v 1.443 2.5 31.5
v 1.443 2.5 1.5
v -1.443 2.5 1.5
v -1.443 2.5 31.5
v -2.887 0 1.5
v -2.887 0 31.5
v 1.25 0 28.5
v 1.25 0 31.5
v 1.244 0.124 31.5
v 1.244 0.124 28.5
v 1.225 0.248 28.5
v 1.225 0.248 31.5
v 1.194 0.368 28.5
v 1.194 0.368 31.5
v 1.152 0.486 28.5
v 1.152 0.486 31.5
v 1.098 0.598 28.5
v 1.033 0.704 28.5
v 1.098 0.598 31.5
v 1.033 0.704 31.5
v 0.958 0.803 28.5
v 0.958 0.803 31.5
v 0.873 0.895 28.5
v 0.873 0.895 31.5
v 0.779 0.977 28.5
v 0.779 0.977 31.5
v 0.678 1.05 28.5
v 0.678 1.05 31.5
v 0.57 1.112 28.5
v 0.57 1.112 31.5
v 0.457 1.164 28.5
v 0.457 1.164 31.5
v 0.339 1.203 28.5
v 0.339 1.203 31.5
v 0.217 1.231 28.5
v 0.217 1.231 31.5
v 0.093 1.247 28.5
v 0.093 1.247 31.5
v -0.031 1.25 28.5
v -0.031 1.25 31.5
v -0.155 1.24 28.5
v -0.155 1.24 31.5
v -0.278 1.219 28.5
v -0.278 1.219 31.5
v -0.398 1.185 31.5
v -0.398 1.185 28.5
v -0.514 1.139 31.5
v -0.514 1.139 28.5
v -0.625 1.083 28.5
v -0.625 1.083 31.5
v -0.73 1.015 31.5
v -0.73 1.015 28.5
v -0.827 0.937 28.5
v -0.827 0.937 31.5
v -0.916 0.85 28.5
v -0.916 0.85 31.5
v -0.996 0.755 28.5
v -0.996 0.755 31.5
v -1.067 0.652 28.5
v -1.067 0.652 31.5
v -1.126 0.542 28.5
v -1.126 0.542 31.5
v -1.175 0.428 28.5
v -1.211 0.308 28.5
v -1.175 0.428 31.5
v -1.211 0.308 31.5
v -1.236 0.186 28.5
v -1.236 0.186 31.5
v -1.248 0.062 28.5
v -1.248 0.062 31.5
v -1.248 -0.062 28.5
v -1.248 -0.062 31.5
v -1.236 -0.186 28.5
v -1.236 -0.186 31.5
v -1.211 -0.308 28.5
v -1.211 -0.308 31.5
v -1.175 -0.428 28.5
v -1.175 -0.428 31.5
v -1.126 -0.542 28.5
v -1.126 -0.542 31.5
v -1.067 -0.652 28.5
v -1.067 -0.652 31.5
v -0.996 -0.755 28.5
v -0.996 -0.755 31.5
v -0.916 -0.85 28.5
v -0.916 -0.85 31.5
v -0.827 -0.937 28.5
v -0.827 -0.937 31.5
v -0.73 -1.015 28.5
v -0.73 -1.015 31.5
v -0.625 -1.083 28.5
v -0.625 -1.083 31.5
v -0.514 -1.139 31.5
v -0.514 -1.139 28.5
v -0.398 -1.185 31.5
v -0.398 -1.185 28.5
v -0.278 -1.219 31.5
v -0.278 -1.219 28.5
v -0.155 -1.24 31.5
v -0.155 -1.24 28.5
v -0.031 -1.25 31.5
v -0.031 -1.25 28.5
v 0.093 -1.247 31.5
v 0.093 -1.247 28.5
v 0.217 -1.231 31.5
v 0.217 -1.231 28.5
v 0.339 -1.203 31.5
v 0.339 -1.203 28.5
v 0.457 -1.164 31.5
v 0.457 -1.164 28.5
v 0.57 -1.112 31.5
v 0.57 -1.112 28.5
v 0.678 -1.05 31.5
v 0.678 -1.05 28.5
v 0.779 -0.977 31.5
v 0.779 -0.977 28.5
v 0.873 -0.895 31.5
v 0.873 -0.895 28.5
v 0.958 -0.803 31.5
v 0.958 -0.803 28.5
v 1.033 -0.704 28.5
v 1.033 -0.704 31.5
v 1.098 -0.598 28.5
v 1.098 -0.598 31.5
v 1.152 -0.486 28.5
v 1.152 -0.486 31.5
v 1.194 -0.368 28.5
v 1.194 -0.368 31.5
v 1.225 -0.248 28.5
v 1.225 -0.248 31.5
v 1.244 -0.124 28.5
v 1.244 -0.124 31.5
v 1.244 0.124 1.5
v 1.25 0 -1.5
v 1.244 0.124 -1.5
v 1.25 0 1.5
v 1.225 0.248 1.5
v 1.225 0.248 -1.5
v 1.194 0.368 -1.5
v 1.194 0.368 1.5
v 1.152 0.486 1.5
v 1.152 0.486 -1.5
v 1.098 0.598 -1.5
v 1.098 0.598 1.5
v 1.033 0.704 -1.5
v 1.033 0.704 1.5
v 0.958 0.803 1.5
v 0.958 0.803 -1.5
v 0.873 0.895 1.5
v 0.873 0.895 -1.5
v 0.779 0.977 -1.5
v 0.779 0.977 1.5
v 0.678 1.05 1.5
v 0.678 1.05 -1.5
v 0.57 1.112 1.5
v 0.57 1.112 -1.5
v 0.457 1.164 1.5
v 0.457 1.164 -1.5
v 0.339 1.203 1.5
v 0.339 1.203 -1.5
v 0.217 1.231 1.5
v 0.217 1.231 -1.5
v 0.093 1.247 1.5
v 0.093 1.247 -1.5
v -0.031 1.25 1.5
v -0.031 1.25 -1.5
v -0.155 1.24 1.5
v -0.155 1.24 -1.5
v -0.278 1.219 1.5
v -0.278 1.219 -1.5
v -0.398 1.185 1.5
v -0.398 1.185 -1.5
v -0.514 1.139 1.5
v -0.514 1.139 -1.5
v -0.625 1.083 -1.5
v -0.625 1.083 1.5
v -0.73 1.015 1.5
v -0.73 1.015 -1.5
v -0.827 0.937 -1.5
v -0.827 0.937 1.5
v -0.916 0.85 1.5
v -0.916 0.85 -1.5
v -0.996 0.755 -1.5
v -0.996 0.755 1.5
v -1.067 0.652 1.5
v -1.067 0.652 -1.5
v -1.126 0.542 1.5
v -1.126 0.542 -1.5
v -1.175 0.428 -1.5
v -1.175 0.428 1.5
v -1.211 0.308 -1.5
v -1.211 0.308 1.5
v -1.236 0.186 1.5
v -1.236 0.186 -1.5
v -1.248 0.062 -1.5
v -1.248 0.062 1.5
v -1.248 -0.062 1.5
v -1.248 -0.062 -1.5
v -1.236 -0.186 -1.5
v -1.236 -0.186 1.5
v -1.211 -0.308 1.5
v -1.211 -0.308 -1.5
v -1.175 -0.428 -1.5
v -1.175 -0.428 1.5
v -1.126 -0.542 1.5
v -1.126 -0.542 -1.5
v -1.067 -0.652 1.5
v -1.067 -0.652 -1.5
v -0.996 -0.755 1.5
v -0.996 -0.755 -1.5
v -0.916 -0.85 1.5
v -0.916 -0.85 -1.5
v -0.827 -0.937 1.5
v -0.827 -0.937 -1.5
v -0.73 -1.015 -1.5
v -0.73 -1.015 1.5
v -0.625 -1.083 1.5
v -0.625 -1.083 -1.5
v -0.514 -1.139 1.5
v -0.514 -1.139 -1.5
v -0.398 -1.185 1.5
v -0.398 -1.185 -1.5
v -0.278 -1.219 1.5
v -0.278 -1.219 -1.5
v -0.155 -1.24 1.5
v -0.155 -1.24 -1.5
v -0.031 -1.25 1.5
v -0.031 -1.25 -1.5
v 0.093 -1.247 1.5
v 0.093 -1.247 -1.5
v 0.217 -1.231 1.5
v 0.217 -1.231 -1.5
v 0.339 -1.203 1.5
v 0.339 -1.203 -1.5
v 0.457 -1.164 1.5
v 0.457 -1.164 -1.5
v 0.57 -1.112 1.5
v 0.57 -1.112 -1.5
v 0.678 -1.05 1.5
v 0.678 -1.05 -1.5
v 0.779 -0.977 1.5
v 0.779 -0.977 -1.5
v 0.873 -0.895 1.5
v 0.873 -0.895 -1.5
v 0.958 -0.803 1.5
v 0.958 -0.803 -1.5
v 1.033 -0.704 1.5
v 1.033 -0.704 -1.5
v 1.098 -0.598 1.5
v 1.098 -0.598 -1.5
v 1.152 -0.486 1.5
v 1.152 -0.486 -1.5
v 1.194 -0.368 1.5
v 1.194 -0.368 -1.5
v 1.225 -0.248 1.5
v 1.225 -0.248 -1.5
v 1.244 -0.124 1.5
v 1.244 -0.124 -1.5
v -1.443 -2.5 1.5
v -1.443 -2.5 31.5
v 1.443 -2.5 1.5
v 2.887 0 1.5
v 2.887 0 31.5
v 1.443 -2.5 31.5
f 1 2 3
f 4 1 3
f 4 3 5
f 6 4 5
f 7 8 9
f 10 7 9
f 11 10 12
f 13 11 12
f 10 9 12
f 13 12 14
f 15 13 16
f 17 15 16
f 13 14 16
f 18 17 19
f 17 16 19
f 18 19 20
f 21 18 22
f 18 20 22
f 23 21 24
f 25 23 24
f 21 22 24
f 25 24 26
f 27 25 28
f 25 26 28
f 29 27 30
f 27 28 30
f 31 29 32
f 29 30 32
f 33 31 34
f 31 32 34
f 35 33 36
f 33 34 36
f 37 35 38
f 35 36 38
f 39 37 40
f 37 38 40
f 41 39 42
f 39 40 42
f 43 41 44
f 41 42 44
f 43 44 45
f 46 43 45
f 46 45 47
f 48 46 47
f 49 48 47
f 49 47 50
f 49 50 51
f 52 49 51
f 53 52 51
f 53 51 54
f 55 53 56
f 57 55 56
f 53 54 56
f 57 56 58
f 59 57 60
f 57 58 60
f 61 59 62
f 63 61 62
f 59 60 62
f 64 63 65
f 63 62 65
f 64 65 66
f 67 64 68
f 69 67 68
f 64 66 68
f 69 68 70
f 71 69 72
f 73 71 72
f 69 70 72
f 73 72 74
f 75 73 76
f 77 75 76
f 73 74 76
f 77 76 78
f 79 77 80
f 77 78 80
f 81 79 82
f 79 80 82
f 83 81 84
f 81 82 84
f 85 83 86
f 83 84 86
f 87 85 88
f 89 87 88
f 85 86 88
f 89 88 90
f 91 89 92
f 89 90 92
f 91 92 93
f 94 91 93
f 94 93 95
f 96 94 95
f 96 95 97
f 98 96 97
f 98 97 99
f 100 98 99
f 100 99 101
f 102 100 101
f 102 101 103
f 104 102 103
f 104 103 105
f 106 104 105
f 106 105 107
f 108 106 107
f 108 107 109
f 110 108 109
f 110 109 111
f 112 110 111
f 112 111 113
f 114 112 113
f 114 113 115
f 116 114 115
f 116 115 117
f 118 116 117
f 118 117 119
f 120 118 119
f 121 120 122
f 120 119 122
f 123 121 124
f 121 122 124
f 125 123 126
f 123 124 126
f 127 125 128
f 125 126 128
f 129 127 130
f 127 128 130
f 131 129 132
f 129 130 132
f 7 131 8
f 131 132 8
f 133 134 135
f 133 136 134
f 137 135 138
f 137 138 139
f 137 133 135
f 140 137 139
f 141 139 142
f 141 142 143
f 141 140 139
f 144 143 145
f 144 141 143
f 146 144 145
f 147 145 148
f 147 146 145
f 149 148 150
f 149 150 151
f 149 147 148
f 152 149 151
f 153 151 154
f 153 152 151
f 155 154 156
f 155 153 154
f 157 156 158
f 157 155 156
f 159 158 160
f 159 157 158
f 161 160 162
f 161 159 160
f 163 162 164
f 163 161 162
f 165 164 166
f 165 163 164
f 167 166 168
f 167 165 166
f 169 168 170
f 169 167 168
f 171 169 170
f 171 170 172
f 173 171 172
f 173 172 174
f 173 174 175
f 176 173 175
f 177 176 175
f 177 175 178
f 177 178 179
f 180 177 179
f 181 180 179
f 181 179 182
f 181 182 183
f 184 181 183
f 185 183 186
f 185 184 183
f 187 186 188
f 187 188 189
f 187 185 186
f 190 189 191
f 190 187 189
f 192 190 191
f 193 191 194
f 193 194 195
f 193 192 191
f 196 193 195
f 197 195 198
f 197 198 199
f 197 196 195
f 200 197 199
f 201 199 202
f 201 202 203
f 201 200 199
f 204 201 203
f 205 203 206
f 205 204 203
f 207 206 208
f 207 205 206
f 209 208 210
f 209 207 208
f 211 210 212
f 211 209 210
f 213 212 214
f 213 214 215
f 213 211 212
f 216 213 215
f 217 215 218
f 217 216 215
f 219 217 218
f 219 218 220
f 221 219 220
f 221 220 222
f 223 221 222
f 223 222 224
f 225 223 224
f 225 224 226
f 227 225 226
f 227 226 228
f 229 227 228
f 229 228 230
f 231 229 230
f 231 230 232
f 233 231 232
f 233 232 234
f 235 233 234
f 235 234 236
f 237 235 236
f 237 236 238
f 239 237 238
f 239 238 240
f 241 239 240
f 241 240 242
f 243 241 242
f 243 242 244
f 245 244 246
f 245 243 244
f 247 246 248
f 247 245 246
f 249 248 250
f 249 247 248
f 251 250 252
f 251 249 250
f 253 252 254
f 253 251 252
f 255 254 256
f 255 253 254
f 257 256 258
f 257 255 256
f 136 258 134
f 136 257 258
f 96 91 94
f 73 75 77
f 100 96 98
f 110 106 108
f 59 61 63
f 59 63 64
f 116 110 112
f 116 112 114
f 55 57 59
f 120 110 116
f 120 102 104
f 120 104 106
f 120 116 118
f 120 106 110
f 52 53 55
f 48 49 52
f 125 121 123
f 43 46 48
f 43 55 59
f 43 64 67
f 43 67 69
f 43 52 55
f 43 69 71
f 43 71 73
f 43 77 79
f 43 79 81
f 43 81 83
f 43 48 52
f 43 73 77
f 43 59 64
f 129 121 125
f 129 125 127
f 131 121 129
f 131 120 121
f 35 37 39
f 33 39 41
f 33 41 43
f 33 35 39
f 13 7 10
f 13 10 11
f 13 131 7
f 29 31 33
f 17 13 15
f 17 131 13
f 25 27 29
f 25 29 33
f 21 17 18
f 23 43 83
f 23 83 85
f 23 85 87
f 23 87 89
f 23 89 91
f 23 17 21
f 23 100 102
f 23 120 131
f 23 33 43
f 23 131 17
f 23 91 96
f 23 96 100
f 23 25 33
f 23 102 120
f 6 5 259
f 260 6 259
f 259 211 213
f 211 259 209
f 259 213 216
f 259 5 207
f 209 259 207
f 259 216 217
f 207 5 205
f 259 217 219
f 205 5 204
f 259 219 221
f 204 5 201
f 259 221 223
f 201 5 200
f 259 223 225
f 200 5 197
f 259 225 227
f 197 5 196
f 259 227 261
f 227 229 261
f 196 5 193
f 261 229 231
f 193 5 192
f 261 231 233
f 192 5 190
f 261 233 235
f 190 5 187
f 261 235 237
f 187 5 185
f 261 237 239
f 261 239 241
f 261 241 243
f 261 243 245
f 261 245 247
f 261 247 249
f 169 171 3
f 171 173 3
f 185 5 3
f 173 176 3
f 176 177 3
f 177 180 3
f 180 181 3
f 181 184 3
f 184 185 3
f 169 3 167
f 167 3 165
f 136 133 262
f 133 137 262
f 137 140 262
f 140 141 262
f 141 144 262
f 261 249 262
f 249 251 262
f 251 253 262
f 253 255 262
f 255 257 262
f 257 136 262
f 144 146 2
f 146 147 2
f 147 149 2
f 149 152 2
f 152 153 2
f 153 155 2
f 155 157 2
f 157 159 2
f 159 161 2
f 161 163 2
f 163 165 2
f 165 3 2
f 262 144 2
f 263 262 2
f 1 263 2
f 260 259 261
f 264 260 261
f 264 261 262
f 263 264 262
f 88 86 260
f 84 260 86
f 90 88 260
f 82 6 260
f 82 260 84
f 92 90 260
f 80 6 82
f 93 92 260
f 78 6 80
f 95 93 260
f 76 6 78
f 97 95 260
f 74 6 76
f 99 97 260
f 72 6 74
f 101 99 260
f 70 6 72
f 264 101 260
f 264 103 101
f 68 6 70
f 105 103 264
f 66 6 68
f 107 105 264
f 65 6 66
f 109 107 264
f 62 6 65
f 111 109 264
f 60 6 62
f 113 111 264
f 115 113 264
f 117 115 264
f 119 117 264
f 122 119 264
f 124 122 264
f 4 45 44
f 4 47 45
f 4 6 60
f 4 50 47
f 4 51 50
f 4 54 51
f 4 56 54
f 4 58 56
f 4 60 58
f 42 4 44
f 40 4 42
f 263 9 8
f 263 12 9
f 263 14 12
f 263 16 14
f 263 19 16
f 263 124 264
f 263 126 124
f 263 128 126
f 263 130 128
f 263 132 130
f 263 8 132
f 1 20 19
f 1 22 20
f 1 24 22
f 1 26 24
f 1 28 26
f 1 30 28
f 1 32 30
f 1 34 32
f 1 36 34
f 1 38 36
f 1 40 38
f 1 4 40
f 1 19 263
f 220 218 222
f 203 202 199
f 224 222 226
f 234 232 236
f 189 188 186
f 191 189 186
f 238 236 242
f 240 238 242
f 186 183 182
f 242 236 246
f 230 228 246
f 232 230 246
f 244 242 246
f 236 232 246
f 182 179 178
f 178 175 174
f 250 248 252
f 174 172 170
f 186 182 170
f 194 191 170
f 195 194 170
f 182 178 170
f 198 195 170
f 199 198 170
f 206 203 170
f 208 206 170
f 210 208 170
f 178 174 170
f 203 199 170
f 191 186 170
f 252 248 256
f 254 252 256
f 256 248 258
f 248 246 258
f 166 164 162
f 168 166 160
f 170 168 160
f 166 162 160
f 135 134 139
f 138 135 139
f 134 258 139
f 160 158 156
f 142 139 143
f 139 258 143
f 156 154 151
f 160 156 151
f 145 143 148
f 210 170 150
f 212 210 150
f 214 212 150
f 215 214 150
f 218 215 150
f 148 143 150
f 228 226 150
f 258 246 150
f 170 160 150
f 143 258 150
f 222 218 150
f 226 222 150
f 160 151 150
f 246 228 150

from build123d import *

# Parameters (mm, degrees)
F0_R     = 1.25
F1_DEPTH = 1.5
F2_R     = 1.25
F3_DEPTH = 30
F4_R     = 1.25
F5_DEPTH = 3


with BuildPart() as f1:
    # F0 (on Top) → F1 (new body, symmetric)
    with BuildSketch(Plane.XY):
        Circle(F0_R)
    extrude(amount=F1_DEPTH, both=True)

    # F2 (on face) → F3 (join)
    with BuildSketch(Plane.XY.offset(1.5)):
        Polygon((-1.443375673, -2.5), (1.443375673, -2.5), (2.8867513459, 0), (1.443375673, 2.5), (-1.443375673, 2.5), (-2.8867513459, 0), align=None)
        Circle(F2_R, mode=Mode.SUBTRACT)
        Circle(F2_R)
    extrude(amount=F3_DEPTH)

    # F4 (on face) → F5 (cut)
    with BuildSketch(Plane.XY.offset(31.5)):
        Circle(F4_R)
    extrude(amount=-F5_DEPTH, mode=Mode.SUBTRACT)


solid = f1.part
